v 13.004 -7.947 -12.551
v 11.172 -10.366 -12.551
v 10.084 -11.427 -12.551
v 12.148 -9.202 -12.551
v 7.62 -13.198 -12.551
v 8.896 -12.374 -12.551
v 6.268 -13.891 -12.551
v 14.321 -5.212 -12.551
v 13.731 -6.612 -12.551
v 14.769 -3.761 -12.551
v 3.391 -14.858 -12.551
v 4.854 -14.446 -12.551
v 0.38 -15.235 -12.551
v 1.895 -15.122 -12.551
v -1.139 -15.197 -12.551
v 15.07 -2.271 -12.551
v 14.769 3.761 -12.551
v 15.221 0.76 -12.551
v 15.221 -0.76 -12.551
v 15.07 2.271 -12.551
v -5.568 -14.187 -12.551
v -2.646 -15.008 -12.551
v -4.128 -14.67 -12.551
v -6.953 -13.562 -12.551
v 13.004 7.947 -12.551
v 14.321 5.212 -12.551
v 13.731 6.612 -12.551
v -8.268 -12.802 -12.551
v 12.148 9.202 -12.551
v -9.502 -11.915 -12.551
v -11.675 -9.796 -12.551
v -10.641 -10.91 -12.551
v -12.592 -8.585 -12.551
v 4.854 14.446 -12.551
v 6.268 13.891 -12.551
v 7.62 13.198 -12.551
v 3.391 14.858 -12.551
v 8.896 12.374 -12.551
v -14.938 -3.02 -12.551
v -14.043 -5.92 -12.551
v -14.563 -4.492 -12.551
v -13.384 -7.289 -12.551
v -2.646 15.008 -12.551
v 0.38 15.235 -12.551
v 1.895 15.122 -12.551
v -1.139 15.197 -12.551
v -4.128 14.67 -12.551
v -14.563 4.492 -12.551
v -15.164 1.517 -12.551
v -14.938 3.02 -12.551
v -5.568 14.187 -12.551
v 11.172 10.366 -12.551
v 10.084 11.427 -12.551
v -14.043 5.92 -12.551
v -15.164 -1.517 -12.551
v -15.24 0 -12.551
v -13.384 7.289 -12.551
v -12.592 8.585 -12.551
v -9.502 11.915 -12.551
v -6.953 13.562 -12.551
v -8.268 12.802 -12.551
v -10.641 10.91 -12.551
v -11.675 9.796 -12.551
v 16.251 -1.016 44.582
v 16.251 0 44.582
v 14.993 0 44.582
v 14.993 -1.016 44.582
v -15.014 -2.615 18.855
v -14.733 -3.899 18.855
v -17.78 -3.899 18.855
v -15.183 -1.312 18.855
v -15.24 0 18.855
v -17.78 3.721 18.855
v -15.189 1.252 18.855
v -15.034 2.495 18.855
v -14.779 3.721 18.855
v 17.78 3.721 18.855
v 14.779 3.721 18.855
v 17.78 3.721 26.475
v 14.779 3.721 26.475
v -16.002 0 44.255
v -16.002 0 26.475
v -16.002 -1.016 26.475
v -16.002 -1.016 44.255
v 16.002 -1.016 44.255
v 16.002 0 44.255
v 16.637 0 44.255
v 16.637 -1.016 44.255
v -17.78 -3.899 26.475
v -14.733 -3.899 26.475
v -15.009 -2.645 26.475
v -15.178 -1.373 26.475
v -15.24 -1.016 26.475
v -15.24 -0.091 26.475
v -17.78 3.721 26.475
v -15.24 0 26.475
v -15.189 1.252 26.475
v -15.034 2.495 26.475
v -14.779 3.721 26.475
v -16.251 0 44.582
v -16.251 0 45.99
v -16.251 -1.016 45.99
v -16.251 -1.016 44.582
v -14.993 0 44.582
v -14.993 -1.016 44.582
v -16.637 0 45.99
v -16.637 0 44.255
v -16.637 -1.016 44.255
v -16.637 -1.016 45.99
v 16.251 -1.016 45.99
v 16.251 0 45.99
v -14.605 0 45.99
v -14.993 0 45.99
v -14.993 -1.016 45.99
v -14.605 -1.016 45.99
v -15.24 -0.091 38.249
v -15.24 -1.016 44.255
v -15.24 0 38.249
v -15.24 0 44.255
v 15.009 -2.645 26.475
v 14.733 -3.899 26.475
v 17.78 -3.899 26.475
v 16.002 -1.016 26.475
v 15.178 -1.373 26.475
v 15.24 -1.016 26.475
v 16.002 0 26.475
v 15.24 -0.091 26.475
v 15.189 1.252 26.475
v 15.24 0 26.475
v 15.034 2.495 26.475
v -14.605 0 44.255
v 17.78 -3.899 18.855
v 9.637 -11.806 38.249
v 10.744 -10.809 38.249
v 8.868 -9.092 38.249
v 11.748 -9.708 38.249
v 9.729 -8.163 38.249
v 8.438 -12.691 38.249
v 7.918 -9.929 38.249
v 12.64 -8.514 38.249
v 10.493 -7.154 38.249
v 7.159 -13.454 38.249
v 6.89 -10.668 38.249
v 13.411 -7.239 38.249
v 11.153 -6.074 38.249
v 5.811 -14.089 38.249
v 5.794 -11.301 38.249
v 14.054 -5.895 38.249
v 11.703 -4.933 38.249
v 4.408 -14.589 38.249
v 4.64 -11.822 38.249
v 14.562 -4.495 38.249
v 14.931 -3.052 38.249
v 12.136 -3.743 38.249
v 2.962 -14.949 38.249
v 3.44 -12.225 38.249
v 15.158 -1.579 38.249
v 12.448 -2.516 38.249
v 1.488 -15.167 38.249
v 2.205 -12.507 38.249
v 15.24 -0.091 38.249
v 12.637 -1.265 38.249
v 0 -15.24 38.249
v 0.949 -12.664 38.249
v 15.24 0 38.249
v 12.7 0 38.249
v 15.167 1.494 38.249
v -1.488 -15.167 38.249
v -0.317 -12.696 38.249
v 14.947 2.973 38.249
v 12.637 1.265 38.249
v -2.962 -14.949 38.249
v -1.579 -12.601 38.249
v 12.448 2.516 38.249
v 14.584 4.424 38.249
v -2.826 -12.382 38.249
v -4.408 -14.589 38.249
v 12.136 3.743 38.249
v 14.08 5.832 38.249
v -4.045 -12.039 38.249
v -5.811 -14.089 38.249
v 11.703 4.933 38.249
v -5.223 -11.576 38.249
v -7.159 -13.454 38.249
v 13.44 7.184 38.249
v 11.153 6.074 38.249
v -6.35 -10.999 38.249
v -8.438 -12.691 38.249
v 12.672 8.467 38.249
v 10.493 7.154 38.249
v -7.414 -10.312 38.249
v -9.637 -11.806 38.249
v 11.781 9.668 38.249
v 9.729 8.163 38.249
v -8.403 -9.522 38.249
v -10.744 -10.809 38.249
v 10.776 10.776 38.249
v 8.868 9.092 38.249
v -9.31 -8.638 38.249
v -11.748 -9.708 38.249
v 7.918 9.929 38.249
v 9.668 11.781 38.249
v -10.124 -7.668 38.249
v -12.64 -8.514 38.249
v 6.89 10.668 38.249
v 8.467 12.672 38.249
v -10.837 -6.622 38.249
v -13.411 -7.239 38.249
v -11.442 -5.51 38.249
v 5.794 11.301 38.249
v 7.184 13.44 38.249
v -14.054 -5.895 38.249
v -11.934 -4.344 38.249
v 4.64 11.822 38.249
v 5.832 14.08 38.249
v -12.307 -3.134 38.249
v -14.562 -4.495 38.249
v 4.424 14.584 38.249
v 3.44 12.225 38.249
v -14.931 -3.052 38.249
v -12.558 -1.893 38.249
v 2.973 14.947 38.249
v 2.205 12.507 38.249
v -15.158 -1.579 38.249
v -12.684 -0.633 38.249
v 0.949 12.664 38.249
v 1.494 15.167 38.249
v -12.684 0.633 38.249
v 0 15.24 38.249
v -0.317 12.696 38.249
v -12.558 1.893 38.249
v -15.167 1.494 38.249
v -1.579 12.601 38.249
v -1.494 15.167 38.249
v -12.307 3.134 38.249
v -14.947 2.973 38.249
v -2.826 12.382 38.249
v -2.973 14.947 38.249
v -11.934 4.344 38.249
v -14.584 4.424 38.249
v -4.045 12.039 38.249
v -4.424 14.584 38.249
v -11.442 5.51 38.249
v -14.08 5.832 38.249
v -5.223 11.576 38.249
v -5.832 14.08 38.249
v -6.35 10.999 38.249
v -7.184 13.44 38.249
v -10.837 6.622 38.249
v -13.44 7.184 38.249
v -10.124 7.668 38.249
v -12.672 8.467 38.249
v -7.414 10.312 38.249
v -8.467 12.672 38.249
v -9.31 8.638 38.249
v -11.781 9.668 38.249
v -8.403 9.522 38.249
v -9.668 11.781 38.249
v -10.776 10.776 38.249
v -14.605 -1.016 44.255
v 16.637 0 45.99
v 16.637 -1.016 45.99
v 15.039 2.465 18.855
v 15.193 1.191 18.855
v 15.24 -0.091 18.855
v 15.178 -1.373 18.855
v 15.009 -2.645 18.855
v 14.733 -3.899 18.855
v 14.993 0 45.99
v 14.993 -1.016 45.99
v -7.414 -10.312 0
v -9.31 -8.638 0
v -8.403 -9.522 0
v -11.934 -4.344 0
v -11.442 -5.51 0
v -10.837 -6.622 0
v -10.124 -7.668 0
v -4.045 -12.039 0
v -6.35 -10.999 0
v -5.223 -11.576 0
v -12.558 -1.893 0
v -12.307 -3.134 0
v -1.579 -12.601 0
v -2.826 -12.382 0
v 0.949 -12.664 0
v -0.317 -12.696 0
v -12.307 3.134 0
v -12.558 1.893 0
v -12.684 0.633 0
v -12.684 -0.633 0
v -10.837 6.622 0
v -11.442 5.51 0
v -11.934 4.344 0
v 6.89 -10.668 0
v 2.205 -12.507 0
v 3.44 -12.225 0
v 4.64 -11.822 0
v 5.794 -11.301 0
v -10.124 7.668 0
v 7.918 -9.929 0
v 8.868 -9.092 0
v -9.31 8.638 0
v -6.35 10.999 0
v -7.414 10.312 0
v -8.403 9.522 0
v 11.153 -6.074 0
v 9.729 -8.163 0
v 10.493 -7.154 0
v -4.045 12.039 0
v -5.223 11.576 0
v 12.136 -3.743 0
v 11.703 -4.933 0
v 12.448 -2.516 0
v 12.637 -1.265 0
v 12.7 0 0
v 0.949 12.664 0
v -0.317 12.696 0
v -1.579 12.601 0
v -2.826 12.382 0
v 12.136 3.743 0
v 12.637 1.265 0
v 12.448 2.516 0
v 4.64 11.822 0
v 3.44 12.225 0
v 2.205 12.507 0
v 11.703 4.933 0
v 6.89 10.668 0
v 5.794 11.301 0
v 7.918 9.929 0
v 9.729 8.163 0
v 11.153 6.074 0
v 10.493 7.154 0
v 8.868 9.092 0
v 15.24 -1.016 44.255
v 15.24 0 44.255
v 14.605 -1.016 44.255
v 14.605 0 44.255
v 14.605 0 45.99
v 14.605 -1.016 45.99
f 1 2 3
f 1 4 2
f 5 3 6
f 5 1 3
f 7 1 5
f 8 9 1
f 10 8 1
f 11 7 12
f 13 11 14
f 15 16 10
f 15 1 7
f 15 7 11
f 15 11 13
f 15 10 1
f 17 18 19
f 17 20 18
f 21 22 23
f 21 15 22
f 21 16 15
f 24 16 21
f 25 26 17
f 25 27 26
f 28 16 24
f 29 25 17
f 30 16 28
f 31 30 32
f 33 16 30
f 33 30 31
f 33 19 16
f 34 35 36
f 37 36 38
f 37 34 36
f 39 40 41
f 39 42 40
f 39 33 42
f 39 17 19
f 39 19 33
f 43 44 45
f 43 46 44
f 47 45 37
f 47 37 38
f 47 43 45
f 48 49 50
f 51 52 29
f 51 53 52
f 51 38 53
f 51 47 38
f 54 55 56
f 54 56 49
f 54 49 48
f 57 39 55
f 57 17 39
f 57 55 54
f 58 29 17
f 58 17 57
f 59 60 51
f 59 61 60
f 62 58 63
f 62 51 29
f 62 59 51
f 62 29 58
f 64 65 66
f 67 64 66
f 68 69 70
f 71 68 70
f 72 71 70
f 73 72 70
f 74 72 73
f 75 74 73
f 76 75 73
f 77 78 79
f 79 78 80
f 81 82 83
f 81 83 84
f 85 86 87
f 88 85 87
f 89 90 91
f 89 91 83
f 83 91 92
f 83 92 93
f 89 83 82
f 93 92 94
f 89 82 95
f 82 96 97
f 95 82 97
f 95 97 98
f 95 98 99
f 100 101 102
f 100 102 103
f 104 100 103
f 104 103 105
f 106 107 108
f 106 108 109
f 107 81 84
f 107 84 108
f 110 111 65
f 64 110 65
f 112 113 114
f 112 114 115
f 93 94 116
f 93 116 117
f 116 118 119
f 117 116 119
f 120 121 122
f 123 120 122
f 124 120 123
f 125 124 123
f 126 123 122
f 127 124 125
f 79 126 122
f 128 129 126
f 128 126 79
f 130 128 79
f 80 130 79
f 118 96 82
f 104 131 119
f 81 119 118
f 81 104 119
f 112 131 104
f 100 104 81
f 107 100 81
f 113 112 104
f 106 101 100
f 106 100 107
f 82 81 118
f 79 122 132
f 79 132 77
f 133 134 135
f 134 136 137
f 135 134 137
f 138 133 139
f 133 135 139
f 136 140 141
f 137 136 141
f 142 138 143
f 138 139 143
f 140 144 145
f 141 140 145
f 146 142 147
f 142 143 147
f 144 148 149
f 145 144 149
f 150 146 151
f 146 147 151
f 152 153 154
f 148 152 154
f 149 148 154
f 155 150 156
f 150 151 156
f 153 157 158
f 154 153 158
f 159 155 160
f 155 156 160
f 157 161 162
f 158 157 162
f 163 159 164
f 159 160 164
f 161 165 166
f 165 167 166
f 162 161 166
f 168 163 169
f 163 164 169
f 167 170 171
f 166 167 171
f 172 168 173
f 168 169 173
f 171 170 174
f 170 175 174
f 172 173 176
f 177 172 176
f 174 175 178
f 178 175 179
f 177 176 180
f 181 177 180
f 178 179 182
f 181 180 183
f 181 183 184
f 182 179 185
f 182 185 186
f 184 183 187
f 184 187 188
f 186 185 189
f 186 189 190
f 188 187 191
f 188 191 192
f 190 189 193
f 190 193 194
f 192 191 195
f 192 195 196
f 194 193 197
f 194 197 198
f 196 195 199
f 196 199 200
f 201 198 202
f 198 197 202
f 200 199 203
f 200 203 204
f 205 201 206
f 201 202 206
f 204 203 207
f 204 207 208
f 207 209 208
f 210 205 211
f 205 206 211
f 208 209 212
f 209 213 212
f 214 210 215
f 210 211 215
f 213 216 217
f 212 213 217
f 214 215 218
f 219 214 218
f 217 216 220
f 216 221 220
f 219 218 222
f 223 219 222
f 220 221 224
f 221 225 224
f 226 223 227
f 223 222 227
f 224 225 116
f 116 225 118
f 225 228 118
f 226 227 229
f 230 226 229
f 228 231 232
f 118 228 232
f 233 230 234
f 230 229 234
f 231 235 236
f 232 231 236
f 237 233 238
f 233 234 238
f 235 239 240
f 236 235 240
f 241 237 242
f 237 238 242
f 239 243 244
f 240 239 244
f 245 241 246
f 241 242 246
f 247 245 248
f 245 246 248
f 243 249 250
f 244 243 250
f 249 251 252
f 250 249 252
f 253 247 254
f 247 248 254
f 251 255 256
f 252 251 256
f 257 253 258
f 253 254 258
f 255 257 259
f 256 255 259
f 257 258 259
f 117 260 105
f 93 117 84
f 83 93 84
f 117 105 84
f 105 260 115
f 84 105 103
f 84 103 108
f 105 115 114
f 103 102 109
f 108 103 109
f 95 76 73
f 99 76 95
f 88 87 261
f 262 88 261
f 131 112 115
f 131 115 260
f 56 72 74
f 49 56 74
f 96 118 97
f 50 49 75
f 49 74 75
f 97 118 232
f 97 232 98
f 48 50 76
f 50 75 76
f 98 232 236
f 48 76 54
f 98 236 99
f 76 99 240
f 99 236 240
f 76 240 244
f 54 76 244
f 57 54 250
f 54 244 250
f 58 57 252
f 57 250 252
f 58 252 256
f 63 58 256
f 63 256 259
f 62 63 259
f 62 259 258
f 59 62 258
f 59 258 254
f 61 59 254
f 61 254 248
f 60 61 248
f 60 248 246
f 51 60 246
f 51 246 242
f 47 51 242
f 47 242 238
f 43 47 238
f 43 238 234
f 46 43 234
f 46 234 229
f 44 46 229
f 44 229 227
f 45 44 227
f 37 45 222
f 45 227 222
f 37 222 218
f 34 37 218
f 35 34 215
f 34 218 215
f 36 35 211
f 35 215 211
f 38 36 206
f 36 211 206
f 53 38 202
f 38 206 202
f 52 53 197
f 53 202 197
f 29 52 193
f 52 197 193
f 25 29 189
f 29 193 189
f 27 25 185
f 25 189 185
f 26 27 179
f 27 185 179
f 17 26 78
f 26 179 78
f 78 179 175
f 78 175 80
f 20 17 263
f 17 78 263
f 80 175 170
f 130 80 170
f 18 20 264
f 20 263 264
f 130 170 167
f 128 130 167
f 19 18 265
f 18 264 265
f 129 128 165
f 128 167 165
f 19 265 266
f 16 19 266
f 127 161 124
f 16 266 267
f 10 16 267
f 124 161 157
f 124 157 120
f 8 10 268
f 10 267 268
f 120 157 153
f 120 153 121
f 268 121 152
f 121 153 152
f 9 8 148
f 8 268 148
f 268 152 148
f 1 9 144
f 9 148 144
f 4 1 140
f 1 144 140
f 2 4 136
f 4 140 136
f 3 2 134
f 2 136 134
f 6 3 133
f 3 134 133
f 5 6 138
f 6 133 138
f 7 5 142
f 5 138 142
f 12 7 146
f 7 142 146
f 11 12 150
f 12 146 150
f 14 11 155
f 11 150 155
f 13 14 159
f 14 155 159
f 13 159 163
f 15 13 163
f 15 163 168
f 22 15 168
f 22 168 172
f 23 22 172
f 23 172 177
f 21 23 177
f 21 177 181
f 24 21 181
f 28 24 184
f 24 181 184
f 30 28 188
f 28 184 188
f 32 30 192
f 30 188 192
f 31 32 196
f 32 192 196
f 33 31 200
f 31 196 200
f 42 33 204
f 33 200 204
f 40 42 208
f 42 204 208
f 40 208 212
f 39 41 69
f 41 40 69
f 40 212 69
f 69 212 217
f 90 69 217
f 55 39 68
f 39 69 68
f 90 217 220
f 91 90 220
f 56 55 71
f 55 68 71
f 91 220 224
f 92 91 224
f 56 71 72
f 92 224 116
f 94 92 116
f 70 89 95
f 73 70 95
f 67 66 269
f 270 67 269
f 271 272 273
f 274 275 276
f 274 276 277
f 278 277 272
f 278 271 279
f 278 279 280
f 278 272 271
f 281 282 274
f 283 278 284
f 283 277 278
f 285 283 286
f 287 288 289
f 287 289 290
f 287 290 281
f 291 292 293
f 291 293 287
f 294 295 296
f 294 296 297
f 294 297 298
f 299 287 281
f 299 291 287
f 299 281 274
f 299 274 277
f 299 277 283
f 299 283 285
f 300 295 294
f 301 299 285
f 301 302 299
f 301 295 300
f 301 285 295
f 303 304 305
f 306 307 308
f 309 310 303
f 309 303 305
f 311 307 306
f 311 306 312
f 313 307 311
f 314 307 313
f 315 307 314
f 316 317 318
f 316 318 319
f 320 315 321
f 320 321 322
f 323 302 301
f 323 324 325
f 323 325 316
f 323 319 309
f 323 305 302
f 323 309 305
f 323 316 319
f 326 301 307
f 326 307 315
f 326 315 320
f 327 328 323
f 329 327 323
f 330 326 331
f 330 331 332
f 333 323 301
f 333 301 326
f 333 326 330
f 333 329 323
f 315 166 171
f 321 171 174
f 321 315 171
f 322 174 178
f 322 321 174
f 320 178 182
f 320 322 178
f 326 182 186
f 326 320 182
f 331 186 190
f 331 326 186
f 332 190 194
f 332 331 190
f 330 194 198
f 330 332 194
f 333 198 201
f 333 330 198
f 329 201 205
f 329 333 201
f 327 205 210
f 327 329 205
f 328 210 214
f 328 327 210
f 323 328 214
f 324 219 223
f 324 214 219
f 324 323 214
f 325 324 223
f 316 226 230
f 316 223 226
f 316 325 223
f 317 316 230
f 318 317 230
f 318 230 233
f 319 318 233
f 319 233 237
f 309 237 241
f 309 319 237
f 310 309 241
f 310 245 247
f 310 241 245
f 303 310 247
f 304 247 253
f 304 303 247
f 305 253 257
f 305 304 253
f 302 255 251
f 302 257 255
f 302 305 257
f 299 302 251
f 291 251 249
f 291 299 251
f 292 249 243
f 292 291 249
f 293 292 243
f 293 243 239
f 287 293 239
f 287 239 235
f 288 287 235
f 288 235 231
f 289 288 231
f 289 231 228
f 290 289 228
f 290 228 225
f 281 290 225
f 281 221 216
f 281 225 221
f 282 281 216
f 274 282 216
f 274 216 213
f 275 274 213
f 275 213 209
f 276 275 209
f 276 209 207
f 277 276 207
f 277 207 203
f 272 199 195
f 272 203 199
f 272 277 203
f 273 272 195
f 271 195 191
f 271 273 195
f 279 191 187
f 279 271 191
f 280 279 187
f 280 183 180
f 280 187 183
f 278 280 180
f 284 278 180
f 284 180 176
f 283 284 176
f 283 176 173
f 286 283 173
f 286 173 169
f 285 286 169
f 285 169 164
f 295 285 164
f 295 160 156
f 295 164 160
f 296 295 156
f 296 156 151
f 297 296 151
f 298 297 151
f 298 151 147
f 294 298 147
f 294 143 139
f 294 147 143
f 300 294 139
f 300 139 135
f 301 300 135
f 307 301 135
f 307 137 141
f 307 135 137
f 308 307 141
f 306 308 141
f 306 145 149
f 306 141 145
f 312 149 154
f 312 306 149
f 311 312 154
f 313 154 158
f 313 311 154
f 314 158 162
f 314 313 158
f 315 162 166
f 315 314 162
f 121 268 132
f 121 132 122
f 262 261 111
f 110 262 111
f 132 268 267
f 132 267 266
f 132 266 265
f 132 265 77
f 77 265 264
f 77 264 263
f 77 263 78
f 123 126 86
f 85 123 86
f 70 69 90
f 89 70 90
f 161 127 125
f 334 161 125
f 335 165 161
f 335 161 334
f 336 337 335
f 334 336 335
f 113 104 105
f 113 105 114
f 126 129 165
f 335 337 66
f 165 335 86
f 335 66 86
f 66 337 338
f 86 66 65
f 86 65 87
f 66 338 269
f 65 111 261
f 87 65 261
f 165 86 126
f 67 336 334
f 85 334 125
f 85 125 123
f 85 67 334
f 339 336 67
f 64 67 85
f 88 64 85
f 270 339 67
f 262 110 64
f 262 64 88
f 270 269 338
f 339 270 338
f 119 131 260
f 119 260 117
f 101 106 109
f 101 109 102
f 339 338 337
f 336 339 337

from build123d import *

# Parameters (mm, degrees)
F0_W     = 15.24
F0_H     = 50.8
F2_W     = 7.62
F2_H     = 7.62
F3_DEPTH = 17.78
F5_W     = 0.762
F5_H     = 17.78
F6_DEPTH = 1.016
F8_R     = 12.7
F9_DEPTH = 51.562


# Not quite as in the source:
# - a feature names something its author has since deleted; it is built from what else it names


with BuildPart() as f1:
    # F0 (on Front) → F1 (revolve)
    with BuildSketch(Plane.XZ):
        with Locations((-7.62, 12.8494124473)):
            Rectangle(F0_W, F0_H)
    revolve(axis=Axis((0, 0, 12.8494124473), (0, 0, -1)))

    # F2 (on Right) → F3 (join)
    with BuildSketch(Plane.YZ):
        with Locations((-0.0885345507, 22.6649723111)):
            Rectangle(F2_W, F2_H)
    extrude(amount=F3_DEPTH)

    # F4: F1 across plane


with BuildPart() as f1_1:
    add(f1.part)
    add(f1.part.mirror(Plane.YZ))

    # F5 (on Front) → F6 (join)
    with BuildSketch(Plane.XZ):
        Polygon((15.2397256883, 44.2549723111), (16.0017256883, 44.2549723111), (16.6367256883, 44.2549723111), (16.6367256883, 45.9895022213), (16.2511286259, 45.9895022213), (16.2511286259, 44.5822738111), (14.9926585078, 44.5822738111), (14.9926585078, 45.9895022213), (14.6047256883, 45.9895022213), (14.6047256883, 44.2549723111), align=None)
        with Locations((15.6207256883, 35.3649723111)):
            Rectangle(F5_W, F5_H)
    extrude(amount=F6_DEPTH)

    # F7: F1 across plane


with BuildPart() as f1_2:
    add(f1_1.part)
    add(f1_1.part.mirror(Plane.YZ))

    # F8 (on Top) → F9 (cut)
    with BuildSketch(Plane.XY):
        Circle(F8_R)
    extrude(amount=F9_DEPTH, mode=Mode.SUBTRACT)


solid = f1_2.part
